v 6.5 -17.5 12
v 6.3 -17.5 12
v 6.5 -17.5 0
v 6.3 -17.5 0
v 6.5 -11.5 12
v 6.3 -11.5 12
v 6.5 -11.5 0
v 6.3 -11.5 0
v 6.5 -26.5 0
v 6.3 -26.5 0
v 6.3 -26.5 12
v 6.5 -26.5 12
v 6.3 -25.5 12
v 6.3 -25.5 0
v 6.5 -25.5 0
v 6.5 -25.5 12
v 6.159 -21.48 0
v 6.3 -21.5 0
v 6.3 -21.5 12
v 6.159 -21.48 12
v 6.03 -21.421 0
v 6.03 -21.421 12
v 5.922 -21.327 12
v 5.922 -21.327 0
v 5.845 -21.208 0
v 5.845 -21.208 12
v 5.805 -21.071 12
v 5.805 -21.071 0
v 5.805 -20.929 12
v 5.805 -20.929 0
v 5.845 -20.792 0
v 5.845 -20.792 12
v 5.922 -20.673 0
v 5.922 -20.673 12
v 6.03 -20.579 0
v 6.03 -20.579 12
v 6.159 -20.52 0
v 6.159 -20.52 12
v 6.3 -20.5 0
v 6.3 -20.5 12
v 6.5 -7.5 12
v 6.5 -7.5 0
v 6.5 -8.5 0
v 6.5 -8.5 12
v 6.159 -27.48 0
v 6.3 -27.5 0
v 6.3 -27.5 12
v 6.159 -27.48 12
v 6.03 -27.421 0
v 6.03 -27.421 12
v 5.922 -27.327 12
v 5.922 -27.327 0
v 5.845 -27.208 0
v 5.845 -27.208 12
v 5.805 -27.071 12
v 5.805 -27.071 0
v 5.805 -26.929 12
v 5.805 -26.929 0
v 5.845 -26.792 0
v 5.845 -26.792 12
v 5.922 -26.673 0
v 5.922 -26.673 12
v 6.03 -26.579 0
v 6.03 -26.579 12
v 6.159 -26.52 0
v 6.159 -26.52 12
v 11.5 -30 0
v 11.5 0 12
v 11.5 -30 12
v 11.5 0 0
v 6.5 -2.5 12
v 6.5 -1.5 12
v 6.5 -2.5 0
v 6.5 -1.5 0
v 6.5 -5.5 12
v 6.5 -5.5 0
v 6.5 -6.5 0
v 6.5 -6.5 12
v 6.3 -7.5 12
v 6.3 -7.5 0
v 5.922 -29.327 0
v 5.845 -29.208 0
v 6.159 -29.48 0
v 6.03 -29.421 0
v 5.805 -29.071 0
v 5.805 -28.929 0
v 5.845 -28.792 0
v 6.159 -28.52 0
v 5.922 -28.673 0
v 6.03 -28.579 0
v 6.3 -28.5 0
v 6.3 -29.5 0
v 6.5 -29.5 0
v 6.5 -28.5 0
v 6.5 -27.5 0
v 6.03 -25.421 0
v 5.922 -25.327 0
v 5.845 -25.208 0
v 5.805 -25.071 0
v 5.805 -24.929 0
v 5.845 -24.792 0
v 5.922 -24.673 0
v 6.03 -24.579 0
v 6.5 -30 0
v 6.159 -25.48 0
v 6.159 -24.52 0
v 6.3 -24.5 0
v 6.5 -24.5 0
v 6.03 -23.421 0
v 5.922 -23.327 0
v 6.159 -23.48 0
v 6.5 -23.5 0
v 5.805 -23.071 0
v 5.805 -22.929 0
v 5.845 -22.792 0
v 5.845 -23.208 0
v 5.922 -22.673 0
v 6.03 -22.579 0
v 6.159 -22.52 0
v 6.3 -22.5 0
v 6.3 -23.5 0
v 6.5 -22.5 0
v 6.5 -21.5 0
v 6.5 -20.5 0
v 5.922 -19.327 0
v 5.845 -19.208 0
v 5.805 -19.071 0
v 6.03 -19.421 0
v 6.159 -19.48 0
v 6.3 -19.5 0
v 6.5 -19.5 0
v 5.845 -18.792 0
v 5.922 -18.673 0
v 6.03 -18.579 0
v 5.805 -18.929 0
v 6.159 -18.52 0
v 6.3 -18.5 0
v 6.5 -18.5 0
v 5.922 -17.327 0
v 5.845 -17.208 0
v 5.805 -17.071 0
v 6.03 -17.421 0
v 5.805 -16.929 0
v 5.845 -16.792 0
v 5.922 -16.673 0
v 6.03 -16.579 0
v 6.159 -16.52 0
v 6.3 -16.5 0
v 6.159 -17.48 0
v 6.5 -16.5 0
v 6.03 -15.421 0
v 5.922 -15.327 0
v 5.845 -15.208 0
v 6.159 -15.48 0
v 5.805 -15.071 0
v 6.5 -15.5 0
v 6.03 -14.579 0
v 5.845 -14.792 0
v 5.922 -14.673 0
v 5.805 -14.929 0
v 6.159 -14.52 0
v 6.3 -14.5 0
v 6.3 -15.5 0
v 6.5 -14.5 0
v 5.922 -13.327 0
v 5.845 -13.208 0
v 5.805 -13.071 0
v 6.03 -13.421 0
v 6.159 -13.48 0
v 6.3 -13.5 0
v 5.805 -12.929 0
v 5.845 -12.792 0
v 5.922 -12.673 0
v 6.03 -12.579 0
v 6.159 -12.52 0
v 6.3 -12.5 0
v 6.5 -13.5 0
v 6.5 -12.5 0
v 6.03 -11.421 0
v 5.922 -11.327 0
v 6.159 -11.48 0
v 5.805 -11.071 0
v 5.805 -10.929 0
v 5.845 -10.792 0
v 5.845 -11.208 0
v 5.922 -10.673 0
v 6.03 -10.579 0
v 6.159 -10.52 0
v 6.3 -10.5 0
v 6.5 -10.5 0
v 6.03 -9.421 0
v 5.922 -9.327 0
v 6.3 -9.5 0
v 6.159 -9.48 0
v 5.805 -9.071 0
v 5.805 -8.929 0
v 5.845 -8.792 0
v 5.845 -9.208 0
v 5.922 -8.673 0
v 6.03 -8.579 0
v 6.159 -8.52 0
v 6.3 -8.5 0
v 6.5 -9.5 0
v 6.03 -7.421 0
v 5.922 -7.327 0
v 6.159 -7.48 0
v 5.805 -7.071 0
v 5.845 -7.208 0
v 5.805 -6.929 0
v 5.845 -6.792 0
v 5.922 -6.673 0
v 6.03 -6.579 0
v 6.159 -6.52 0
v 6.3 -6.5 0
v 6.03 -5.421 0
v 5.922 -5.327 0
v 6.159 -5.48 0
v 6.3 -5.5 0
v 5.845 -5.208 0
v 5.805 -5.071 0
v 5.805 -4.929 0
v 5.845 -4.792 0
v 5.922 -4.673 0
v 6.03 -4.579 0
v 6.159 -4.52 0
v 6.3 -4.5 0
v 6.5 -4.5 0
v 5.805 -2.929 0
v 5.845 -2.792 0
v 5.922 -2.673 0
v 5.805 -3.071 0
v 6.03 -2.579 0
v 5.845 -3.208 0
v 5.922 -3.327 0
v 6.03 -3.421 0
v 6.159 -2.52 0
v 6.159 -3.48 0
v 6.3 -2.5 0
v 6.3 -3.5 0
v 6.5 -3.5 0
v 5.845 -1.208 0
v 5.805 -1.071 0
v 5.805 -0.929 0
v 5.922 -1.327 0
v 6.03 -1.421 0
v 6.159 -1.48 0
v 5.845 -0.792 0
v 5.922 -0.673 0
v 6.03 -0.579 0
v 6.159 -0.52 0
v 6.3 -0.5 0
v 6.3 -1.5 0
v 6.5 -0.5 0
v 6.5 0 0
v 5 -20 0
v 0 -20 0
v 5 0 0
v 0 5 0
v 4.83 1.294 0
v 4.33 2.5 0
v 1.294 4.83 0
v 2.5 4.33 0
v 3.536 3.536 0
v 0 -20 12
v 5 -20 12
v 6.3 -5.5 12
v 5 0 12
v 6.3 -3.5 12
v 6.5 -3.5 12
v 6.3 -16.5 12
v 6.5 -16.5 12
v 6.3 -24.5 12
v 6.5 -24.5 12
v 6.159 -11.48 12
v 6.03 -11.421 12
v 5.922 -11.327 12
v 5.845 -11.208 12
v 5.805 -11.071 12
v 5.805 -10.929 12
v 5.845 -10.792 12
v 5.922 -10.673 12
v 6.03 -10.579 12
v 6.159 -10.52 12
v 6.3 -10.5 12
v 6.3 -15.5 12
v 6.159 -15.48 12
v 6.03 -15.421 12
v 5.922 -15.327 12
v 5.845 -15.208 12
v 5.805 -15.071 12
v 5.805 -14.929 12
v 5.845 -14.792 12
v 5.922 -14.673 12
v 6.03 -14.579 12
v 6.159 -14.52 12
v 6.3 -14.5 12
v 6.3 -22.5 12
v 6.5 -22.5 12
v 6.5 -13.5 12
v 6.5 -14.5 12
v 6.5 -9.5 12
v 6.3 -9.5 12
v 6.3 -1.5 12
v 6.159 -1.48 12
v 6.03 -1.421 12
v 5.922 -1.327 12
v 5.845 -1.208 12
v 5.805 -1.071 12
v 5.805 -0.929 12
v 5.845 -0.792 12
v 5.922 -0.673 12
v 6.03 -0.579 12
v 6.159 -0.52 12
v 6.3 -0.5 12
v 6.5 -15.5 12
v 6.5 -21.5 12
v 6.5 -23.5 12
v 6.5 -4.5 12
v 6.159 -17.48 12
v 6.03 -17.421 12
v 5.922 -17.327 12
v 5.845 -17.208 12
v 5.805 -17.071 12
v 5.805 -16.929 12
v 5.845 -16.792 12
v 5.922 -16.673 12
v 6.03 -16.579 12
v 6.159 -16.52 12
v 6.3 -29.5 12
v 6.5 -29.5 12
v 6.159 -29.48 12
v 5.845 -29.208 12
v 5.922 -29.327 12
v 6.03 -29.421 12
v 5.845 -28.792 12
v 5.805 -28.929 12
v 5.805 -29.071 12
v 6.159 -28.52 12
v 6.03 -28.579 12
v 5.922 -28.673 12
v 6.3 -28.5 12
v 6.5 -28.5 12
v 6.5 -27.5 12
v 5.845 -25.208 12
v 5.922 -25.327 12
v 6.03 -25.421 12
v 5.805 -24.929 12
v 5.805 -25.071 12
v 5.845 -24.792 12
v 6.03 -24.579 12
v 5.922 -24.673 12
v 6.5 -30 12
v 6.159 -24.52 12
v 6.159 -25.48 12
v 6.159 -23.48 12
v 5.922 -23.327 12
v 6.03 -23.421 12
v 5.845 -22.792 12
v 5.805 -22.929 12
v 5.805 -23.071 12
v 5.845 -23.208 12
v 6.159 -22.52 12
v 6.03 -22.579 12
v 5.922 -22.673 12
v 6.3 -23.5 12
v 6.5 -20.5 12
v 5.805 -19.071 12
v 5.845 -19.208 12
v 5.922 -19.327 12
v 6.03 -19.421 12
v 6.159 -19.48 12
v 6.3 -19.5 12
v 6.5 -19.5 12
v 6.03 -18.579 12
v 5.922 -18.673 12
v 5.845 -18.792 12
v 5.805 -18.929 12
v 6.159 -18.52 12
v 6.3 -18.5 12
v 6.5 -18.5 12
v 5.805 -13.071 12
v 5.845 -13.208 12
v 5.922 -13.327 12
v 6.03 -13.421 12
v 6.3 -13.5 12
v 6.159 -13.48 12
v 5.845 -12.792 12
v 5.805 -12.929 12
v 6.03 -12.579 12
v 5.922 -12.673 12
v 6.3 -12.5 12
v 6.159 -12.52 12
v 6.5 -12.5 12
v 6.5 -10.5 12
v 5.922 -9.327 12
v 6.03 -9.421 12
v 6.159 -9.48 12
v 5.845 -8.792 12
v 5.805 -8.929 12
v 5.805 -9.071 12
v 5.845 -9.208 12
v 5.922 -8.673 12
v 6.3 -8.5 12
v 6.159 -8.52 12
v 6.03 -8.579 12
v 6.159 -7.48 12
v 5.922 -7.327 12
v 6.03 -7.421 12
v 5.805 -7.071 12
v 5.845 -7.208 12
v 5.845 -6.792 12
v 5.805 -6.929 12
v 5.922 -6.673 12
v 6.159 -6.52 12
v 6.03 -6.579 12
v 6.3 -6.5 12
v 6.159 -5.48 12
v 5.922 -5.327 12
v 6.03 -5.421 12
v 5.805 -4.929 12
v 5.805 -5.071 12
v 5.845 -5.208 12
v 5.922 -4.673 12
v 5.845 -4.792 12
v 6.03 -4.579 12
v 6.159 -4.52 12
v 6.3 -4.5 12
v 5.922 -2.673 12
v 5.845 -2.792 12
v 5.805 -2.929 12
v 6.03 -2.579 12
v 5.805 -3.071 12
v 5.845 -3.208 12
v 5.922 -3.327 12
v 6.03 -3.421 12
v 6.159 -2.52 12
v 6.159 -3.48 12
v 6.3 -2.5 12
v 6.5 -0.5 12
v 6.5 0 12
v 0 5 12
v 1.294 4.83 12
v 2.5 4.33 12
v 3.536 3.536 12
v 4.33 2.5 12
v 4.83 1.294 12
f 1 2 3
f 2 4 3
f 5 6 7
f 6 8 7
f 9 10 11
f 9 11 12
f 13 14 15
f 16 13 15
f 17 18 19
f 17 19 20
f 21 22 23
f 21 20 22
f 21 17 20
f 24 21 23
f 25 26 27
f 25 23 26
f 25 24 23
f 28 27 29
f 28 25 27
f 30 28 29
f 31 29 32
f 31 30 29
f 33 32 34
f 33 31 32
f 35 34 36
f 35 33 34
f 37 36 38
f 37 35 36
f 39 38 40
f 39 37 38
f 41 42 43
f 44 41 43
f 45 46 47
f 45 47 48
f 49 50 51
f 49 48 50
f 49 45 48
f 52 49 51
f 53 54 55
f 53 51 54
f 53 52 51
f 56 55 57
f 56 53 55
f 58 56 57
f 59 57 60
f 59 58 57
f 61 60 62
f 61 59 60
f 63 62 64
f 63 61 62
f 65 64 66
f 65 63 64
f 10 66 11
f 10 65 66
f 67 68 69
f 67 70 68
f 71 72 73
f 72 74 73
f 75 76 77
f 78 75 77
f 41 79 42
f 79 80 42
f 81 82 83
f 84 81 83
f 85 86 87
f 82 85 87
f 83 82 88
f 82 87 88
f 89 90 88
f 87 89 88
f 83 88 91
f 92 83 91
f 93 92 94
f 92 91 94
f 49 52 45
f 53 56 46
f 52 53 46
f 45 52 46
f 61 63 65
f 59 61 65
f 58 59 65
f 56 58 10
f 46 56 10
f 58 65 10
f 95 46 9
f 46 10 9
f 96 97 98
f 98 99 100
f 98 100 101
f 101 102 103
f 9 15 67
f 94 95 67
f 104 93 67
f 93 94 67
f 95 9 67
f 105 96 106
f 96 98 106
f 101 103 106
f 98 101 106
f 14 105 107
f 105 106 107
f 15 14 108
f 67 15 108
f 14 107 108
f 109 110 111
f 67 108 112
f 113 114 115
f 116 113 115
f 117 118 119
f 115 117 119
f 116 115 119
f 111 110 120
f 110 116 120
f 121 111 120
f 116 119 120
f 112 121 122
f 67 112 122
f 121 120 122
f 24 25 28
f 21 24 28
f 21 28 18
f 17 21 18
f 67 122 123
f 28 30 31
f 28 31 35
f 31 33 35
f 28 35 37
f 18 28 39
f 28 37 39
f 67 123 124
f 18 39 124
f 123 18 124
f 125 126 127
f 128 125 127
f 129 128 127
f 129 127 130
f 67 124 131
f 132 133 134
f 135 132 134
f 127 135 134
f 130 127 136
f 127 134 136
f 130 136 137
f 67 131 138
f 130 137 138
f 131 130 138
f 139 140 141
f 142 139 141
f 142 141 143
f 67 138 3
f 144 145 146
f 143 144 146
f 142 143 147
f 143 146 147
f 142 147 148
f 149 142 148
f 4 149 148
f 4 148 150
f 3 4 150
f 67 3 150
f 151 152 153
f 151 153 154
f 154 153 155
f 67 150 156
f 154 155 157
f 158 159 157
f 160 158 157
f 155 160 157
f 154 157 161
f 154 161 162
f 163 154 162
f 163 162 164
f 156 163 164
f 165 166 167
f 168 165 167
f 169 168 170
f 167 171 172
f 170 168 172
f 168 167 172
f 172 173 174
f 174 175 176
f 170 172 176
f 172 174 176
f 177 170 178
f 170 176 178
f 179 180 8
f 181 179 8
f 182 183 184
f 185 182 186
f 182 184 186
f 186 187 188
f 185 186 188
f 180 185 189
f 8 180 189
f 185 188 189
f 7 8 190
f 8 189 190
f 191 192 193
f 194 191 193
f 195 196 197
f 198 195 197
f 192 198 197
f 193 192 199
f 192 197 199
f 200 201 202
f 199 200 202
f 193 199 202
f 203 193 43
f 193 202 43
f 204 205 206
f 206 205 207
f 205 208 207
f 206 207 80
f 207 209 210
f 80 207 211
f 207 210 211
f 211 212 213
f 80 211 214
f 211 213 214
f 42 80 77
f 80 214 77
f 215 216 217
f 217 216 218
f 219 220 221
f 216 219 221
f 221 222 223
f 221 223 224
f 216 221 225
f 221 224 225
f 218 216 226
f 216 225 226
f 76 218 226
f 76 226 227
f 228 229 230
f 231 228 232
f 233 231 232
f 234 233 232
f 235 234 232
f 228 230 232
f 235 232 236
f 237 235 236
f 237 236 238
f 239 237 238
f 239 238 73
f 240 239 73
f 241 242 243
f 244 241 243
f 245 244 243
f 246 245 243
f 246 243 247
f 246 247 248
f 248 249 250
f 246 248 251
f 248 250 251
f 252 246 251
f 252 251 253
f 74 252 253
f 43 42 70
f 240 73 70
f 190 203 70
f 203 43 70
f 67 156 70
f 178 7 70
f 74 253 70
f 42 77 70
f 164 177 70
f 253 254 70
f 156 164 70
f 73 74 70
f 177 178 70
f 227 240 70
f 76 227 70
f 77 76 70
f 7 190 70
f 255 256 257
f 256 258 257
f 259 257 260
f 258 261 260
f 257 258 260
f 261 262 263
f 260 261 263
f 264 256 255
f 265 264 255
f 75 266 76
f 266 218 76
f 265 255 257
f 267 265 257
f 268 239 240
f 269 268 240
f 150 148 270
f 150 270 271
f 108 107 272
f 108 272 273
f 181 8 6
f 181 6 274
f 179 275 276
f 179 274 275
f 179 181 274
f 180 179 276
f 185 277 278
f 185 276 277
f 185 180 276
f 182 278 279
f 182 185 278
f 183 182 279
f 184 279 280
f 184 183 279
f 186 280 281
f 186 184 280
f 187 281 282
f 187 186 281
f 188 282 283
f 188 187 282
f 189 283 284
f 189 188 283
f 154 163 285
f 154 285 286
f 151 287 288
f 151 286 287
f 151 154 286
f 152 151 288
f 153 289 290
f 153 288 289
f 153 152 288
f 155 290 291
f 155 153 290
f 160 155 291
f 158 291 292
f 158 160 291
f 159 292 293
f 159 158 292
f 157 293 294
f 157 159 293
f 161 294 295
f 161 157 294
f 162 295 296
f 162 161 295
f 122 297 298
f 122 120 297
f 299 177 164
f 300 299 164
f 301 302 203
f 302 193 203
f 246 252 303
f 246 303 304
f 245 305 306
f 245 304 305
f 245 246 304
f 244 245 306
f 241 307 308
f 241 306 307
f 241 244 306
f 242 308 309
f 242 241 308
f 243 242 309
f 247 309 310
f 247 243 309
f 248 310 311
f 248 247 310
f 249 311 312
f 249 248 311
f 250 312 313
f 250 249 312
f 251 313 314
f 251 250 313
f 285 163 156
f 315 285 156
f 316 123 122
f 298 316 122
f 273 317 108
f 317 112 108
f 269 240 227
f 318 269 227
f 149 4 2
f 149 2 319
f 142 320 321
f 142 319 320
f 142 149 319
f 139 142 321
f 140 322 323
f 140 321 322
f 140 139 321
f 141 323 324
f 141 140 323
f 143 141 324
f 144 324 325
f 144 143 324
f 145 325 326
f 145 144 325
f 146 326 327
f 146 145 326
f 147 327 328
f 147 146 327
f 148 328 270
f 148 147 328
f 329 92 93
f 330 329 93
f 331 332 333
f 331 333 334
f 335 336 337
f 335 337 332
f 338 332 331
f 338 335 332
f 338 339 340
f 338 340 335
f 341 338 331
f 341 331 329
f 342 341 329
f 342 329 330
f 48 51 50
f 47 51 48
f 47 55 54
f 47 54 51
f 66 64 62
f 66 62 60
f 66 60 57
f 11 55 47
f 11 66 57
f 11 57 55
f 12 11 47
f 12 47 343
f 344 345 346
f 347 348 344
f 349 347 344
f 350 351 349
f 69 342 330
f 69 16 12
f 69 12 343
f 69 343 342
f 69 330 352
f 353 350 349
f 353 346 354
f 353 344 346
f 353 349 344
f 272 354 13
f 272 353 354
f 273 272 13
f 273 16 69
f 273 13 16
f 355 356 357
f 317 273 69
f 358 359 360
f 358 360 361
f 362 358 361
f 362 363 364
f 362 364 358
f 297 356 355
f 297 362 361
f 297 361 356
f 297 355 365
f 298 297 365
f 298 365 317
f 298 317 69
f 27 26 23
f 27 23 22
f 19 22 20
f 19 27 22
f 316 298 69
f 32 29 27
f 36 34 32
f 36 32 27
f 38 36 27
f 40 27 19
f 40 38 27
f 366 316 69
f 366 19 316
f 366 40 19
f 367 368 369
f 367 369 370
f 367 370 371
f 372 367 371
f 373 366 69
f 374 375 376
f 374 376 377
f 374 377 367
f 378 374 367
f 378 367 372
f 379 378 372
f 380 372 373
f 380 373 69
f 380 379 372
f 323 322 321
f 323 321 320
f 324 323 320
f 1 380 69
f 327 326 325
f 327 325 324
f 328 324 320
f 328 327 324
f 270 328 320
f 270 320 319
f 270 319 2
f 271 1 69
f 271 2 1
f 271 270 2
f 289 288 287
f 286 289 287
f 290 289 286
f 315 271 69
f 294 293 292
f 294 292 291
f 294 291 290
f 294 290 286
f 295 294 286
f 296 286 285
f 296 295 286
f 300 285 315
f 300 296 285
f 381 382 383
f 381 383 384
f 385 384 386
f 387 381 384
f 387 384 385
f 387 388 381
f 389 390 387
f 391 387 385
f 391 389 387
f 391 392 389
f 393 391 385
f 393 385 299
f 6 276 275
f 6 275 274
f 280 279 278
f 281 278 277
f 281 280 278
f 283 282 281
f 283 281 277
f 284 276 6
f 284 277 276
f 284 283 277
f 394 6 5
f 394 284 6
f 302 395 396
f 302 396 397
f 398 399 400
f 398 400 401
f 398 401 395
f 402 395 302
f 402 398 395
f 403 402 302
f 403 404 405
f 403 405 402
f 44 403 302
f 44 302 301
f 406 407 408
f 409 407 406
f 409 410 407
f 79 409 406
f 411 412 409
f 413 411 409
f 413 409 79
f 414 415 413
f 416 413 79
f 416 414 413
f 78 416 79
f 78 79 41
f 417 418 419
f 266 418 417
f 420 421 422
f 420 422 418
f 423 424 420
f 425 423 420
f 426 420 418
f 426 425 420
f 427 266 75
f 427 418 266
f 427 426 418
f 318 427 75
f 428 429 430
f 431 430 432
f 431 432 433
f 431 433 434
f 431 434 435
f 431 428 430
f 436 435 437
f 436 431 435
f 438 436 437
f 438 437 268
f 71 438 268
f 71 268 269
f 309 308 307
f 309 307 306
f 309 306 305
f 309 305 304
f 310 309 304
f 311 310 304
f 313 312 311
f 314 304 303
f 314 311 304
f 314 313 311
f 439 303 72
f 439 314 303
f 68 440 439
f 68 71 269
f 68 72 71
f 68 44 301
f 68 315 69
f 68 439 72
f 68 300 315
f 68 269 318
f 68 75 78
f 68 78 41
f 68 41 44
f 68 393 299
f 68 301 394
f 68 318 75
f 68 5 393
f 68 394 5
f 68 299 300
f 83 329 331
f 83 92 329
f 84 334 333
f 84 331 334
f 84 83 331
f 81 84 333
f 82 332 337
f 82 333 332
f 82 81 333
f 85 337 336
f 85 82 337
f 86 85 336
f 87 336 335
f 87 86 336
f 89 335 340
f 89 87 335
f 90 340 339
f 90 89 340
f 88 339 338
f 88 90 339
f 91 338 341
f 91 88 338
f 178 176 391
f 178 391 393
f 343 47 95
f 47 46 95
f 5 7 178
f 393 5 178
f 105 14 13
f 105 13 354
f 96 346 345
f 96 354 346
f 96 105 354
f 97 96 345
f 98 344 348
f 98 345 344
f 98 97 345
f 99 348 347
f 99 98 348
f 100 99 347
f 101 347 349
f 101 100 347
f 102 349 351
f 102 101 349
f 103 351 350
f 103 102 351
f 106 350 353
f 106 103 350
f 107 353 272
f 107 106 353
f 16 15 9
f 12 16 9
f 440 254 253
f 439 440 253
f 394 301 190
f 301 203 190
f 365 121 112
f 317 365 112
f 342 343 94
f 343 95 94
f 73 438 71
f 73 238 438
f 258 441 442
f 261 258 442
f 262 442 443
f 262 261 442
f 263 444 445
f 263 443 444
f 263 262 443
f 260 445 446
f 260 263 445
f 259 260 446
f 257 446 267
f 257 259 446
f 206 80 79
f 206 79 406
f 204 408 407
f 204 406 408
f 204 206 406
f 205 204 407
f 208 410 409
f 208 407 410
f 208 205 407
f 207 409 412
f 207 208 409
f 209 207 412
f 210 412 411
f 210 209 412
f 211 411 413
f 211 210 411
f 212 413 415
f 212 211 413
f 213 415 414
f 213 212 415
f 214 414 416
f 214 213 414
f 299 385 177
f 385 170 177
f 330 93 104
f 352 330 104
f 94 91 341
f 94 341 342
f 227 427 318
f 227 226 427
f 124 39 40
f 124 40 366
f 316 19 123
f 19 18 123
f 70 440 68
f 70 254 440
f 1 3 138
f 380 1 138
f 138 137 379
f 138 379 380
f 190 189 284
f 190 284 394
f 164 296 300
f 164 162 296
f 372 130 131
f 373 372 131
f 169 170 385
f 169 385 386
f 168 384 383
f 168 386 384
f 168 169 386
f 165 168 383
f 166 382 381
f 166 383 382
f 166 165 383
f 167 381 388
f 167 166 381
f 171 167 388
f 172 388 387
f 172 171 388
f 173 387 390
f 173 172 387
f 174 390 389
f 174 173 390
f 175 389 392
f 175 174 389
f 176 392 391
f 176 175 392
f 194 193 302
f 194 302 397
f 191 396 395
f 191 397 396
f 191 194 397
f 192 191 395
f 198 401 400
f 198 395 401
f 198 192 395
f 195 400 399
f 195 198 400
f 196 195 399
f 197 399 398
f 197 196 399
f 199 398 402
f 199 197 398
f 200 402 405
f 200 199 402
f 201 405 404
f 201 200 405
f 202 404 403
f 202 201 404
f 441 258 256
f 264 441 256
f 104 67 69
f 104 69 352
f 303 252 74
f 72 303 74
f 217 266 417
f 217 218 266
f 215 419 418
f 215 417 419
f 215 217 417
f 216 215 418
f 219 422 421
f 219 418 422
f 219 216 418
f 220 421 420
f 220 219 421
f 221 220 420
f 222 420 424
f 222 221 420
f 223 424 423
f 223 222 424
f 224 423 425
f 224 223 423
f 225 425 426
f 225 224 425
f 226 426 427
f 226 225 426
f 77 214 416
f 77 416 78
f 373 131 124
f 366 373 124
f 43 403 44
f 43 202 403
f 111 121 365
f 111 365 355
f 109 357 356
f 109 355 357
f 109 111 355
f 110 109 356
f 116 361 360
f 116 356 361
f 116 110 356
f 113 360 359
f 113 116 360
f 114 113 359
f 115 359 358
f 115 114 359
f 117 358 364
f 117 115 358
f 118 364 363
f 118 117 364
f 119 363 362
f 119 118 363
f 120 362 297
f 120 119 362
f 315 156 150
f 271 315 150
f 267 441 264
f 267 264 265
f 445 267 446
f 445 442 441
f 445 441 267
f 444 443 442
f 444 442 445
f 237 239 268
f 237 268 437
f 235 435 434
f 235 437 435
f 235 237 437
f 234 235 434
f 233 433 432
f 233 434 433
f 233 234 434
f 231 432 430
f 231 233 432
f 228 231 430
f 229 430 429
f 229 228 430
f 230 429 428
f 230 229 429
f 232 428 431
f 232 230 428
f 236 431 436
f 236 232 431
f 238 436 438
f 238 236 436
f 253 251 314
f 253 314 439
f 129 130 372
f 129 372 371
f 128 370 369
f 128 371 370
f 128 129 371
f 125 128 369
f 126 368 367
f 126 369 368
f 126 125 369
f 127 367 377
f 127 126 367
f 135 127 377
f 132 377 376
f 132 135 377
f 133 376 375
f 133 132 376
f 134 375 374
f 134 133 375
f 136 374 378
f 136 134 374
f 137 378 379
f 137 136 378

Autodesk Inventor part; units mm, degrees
ref_plane "YZ Plane" through (0, 0, 0) normal (1, 0, 0) x (0, 1, 0)
ref_plane "XZ Plane" through (0, 0, 0) normal (0, 1, 0) x (-1, 0, 0)
ref_plane "XY Plane" through (0, 0, 0) normal (0, 0, 1) x (1, 0, 0)
sketch "Sketch1" plane through (0, 0, 0) normal (0, 0, 1) x (1, 0, 0)
  arc A0 (5, 0) -> (0, 5) centre (0, 0) ccw
  line L0 (0, 0) -> (0, -20)
  line L1 (0, -20) -> (5, -20)
  line L2 (5, -20) -> (5, 0)
  line L3 (0, 0) -> (0, 5)
  arc A1 (6.3, -0.5) -> (6.3, -1.5) centre (6.3, -1) ccw
  line L4 (6.3, -0.5) -> (6.5, -0.5)
  line L5 (6.3, -1.5) -> (6.5, -1.5)
  line L6 (6.5, 0) -> (6.5, -0.5)
  line L7 (6.5, -1.5) -> (6.5, -2)
  arc A2 (6.3, -2.5) -> (6.3, -3.5) centre (6.3, -3) ccw
  line L8 (6.3, -2.5) -> (6.5, -2.5)
  line L9 (6.3, -3.5) -> (6.5, -3.5)
  line L10 (6.5, -2) -> (6.5, -2.5)
  line L11 (6.5, -3.5) -> (6.5, -4)
  arc A3 (6.3, -4.5) -> (6.3, -5.5) centre (6.3, -5) ccw
  line L12 (6.3, -4.5) -> (6.5, -4.5)
  line L13 (6.3, -5.5) -> (6.5, -5.5)
  line L14 (6.5, -4) -> (6.5, -4.5)
  line L15 (6.5, -5.5) -> (6.5, -6)
  arc A4 (6.3, -6.5) -> (6.3, -7.5) centre (6.3, -7) ccw
  line L16 (6.3, -6.5) -> (6.5, -6.5)
  line L17 (6.3, -7.5) -> (6.5, -7.5)
  line L18 (6.5, -6) -> (6.5, -6.5)
  line L19 (6.5, -7.5) -> (6.5, -8)
  arc A5 (6.3, -8.5) -> (6.3, -9.5) centre (6.3, -9) ccw
  line L20 (6.3, -8.5) -> (6.5, -8.5)
  line L21 (6.3, -9.5) -> (6.5, -9.5)
  line L22 (6.5, -8) -> (6.5, -8.5)
  line L23 (6.5, -9.5) -> (6.5, -10)
  arc A6 (6.3, -10.5) -> (6.3, -11.5) centre (6.3, -11) ccw
  line L24 (6.3, -10.5) -> (6.5, -10.5)
  line L25 (6.3, -11.5) -> (6.5, -11.5)
  line L26 (6.5, -10) -> (6.5, -10.5)
  line L27 (6.5, -11.5) -> (6.5, -12)
  arc A7 (6.3, -12.5) -> (6.3, -13.5) centre (6.3, -13) ccw
  line L28 (6.3, -12.5) -> (6.5, -12.5)
  line L29 (6.3, -13.5) -> (6.5, -13.5)
  line L30 (6.5, -12) -> (6.5, -12.5)
  line L31 (6.5, -13.5) -> (6.5, -14)
  arc A8 (6.3, -14.5) -> (6.3, -15.5) centre (6.3, -15) ccw
  line L32 (6.3, -14.5) -> (6.5, -14.5)
  line L33 (6.3, -15.5) -> (6.5, -15.5)
  line L34 (6.5, -14) -> (6.5, -14.5)
  line L35 (6.5, -15.5) -> (6.5, -16)
  arc A9 (6.3, -16.5) -> (6.3, -17.5) centre (6.3, -17) ccw
  line L36 (6.3, -16.5) -> (6.5, -16.5)
  line L37 (6.3, -17.5) -> (6.5, -17.5)
  line L38 (6.5, -16) -> (6.5, -16.5)
  line L39 (6.5, -17.5) -> (6.5, -18)
  arc A10 (6.3, -18.5) -> (6.3, -19.5) centre (6.3, -19) ccw
  line L40 (6.3, -18.5) -> (6.5, -18.5)
  line L41 (6.3, -19.5) -> (6.5, -19.5)
  line L42 (6.5, -18) -> (6.5, -18.5)
  line L43 (6.5, -19.5) -> (6.5, -20)
  arc A11 (6.3, -20.5) -> (6.3, -21.5) centre (6.3, -21) ccw
  line L44 (6.3, -20.5) -> (6.5, -20.5)
  line L45 (6.3, -21.5) -> (6.5, -21.5)
  line L46 (6.5, -20) -> (6.5, -20.5)
  line L47 (6.5, -21.5) -> (6.5, -22)
  arc A12 (6.3, -22.5) -> (6.3, -23.5) centre (6.3, -23) ccw
  line L48 (6.3, -22.5) -> (6.5, -22.5)
  line L49 (6.3, -23.5) -> (6.5, -23.5)
  line L50 (6.5, -22) -> (6.5, -22.5)
  line L51 (6.5, -23.5) -> (6.5, -24)
  arc A13 (6.3, -24.5) -> (6.3, -25.5) centre (6.3, -25) ccw
  line L52 (6.3, -24.5) -> (6.5, -24.5)
  line L53 (6.3, -25.5) -> (6.5, -25.5)
  line L54 (6.5, -24) -> (6.5, -24.5)
  line L55 (6.5, -25.5) -> (6.5, -26)
  arc A14 (6.3, -26.5) -> (6.3, -27.5) centre (6.3, -27) ccw
  line L56 (6.3, -26.5) -> (6.5, -26.5)
  line L57 (6.3, -27.5) -> (6.5, -27.5)
  line L58 (6.5, -26) -> (6.5, -26.5)
  line L59 (6.5, -27.5) -> (6.5, -28)
  arc A15 (6.3, -28.5) -> (6.3, -29.5) centre (6.3, -29) ccw
  line L60 (6.3, -28.5) -> (6.5, -28.5)
  line L61 (6.3, -29.5) -> (6.5, -29.5)
  line L62 (6.5, -28) -> (6.5, -28.5)
  line L63 (6.5, -29.5) -> (6.5, -30)
  line L64 (6.5, 0) -> (11.5, 0)
  line L65 (11.5, 0) -> (11.5, -30)
  line L66 (11.5, -30) -> (6.5, -30)
  dimension "d0" = 10
  dimension "d15" = 20
  dimension "d22" = 1
  dimension "d23" = 2
  dimension "d25" = 0.2
  dimension "d26" = 0.5
  dimension "d27" = 0.5
  dimension "d28" = 1.5
  dimension "d31" = 2
  dimension "d36" = 5
extrude "Extrusion1" add sketch "Sketch1" along normal blind 12
equation "\"d26\" = d27"
properties part number "BeltClamp"
